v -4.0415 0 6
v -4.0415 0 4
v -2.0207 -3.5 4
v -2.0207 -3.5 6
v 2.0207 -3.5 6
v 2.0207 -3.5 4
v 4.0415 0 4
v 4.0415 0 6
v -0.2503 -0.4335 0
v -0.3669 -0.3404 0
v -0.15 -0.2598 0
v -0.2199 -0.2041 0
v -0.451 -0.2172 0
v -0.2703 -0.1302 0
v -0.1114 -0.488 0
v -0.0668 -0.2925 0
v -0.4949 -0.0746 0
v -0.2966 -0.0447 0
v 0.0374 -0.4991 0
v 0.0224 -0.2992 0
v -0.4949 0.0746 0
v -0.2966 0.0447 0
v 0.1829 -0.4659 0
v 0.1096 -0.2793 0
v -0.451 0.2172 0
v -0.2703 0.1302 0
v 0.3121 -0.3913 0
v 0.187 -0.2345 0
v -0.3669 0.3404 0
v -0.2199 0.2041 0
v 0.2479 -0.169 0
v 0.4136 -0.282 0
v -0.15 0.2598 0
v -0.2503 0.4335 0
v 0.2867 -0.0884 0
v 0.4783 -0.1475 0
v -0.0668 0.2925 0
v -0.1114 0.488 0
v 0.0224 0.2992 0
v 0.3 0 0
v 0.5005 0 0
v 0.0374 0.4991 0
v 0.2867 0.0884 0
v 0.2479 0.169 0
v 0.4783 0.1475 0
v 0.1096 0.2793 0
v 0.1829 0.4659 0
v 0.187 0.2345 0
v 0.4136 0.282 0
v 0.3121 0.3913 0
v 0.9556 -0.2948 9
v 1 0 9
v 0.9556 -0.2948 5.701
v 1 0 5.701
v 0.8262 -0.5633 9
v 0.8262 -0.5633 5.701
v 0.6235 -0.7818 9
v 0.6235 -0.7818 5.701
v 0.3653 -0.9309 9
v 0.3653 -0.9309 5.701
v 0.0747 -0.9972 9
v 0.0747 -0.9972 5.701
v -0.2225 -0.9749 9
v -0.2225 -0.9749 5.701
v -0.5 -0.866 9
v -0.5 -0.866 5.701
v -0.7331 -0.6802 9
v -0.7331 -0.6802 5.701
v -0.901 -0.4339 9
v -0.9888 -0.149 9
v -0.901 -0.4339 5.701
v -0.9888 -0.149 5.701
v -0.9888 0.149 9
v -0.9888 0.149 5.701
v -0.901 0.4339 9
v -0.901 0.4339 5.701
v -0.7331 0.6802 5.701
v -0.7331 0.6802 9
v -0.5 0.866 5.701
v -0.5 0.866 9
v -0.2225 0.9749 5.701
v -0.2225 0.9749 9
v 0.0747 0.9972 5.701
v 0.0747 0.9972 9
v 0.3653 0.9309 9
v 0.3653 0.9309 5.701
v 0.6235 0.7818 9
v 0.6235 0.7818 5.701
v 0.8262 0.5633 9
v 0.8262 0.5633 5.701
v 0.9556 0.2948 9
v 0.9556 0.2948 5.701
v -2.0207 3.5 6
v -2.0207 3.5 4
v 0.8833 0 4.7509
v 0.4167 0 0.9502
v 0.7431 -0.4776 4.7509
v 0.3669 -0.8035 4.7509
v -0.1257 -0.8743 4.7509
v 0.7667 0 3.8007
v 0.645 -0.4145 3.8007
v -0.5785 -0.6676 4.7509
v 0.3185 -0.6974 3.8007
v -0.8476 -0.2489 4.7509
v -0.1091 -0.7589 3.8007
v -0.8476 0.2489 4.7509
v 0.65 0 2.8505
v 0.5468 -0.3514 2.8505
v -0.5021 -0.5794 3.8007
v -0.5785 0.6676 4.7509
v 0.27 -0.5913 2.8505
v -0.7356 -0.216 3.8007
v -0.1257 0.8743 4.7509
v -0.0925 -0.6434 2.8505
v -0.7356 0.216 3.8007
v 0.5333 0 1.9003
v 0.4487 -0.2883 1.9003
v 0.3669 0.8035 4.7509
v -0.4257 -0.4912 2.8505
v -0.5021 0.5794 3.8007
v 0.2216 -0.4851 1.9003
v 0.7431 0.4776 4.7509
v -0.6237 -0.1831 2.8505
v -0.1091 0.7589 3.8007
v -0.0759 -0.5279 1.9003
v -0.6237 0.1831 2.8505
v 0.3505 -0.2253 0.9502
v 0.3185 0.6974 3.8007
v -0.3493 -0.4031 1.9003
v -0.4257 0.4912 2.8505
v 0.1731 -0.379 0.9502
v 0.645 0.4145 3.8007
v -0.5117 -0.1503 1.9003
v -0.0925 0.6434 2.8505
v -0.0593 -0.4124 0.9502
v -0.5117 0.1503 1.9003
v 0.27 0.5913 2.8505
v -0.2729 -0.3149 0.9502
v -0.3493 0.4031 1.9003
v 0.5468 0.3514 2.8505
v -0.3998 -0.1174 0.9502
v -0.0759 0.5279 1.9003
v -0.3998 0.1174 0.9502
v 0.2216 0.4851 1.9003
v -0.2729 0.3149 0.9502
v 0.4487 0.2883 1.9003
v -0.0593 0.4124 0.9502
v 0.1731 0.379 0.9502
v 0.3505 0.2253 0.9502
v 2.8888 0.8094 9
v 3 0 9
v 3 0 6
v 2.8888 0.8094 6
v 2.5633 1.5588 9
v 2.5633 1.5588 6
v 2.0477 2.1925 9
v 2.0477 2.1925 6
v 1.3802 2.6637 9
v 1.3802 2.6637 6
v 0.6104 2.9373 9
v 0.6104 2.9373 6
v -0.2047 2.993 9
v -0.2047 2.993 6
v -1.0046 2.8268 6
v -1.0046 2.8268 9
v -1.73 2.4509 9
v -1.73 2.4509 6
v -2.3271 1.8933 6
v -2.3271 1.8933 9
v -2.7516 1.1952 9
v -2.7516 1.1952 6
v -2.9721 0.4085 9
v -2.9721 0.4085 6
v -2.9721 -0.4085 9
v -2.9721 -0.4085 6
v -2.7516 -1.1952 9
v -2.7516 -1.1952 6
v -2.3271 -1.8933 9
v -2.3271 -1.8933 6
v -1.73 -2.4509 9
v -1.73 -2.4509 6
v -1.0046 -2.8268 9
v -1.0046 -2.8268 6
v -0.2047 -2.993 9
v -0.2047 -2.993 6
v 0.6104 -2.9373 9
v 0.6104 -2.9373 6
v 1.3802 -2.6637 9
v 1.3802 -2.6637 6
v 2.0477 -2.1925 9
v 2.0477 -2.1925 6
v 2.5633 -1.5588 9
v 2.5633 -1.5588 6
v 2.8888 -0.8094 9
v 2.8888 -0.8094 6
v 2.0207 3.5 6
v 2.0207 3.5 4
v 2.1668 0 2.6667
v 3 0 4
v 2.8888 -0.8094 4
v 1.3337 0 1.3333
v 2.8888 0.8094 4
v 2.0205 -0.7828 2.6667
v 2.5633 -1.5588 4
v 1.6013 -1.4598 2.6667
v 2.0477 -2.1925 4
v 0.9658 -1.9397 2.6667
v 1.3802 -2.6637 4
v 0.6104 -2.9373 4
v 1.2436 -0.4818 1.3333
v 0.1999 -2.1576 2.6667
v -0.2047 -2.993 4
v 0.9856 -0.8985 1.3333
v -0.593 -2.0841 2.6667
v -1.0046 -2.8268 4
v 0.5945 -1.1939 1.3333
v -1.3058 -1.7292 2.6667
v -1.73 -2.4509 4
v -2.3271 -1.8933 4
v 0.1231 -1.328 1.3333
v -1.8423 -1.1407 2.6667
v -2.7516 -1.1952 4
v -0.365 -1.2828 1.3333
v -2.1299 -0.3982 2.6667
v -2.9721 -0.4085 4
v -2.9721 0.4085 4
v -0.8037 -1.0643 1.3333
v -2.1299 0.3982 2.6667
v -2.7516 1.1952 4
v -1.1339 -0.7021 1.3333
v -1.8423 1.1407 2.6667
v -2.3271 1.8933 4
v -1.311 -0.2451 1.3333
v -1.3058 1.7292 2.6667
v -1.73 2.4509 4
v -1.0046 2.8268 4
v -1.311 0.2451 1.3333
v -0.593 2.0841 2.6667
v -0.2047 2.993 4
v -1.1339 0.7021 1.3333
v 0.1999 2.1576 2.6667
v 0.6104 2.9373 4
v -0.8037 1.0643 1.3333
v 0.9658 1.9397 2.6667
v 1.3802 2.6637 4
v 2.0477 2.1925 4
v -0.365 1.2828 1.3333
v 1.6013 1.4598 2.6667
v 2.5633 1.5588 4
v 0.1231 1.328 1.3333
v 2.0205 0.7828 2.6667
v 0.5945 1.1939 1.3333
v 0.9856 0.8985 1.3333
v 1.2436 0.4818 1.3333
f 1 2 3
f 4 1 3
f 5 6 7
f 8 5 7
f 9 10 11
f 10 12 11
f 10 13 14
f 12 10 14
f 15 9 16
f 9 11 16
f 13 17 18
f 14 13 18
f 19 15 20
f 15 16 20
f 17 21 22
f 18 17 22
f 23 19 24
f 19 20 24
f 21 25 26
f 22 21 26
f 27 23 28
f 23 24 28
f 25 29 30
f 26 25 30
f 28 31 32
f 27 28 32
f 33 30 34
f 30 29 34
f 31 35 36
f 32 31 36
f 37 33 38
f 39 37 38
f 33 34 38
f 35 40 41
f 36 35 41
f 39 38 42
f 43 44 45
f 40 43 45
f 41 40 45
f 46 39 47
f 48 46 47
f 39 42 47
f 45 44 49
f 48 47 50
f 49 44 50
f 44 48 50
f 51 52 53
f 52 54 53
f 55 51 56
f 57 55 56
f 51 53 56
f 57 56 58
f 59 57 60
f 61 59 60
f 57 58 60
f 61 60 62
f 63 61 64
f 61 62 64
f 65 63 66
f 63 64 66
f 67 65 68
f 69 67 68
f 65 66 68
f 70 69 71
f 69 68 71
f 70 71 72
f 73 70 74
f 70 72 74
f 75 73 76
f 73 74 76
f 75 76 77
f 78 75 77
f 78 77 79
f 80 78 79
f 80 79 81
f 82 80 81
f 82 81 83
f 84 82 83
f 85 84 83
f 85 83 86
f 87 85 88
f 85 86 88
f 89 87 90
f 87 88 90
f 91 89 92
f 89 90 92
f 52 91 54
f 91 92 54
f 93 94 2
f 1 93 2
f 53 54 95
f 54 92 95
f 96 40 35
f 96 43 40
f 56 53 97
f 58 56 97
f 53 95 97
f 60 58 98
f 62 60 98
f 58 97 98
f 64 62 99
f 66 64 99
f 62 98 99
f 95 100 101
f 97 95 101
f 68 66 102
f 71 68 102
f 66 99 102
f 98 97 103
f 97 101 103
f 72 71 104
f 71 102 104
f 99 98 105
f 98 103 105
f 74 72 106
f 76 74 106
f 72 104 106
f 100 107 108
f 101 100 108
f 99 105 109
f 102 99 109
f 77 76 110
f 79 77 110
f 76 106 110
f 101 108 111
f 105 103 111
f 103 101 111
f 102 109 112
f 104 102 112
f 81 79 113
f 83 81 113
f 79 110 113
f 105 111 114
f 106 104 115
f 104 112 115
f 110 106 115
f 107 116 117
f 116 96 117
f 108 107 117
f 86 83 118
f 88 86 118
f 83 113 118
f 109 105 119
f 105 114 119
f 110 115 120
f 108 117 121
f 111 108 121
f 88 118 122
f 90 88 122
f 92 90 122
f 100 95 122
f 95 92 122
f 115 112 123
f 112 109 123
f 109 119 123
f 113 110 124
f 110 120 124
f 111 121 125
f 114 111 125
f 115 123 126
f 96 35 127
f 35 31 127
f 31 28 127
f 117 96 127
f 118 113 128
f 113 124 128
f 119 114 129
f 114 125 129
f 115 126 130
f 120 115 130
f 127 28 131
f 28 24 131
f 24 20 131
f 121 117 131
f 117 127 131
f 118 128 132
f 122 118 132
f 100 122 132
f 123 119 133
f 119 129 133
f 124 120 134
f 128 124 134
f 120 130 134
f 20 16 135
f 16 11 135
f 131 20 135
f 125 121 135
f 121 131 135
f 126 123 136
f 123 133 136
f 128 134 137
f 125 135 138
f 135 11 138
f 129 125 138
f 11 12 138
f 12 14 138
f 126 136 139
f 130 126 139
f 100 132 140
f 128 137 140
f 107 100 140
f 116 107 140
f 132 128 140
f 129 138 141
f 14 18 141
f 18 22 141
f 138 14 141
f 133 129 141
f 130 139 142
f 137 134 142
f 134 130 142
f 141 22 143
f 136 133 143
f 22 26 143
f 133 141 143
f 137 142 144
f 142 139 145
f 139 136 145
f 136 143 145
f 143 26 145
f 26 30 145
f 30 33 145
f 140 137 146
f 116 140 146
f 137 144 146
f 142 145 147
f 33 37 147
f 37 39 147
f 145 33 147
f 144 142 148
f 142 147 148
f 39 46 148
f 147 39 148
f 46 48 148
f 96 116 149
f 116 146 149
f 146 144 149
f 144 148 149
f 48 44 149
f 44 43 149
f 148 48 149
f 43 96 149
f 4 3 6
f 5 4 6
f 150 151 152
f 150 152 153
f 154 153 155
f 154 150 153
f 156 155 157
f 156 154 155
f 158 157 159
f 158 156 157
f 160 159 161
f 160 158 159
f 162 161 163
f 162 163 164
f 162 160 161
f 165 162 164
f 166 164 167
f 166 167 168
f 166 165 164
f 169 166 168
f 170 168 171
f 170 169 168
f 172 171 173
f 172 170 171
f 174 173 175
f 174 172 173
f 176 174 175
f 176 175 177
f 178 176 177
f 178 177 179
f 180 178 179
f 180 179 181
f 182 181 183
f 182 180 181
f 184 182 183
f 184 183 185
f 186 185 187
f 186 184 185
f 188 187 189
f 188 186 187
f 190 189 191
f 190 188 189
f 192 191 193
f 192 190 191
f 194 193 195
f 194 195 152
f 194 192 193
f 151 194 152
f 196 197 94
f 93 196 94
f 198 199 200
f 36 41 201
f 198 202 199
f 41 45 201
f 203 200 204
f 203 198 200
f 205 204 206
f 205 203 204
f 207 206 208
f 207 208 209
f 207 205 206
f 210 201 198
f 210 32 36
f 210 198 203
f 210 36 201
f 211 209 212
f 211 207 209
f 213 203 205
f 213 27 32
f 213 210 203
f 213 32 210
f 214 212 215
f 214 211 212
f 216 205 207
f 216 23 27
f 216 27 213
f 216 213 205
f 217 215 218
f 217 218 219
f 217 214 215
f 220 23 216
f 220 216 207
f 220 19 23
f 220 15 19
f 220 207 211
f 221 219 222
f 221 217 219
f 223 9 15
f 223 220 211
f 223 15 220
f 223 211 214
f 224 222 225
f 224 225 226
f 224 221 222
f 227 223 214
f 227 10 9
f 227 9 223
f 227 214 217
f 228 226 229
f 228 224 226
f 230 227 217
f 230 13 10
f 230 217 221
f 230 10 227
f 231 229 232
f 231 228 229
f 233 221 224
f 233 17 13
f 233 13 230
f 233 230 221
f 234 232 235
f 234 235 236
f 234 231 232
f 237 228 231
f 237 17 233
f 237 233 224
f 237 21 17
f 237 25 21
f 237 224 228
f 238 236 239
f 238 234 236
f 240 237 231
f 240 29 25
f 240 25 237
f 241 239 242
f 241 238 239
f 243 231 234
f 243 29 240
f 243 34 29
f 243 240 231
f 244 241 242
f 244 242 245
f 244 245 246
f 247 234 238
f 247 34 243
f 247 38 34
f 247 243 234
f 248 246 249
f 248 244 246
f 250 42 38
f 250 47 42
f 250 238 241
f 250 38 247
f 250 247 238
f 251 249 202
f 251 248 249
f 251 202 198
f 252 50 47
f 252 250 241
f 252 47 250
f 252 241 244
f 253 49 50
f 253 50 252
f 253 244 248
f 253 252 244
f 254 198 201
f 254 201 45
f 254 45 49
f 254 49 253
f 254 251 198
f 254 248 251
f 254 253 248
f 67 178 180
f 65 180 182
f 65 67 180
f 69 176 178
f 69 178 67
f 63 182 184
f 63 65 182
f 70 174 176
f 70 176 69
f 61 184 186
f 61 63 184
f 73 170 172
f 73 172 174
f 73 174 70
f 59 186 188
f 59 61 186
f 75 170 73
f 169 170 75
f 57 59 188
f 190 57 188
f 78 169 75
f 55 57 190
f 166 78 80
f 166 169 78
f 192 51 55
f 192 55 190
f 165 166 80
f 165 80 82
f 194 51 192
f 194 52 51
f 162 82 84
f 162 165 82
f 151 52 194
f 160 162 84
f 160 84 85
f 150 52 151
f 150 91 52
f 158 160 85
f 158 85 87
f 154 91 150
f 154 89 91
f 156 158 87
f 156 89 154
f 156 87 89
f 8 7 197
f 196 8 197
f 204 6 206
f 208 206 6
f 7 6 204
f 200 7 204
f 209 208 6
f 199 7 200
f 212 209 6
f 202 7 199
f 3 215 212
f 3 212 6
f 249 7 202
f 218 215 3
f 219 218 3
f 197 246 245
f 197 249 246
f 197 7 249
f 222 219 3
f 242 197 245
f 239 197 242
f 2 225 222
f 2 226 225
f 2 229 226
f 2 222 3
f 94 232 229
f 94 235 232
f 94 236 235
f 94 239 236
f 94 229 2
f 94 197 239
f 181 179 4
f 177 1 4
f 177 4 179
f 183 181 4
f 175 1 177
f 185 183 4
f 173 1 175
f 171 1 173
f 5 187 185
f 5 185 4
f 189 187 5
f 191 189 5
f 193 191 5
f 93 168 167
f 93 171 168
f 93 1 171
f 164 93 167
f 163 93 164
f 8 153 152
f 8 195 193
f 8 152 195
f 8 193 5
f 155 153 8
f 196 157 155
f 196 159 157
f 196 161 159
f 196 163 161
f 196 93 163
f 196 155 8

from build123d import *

# Parameters (mm, degrees)
BOSS_EXTRU_1_DEPTH      = 9
ESQUISSE2_W             = 19.623971562
ESQUISSE2_H             = 15.534154535
ESQUISSE2_R             = 3
ENL_V_MAT_EXTRU_1_DEPTH = 3
ENL_V_START             = -4
ESQUISSE3_W             = 11.267201257
ESQUISSE3_H             = 13.961169169
ESQUISSE3_R             = 3
ENL_V_MAT_EXTRU_2_DEPTH = 4
CHANFREIN1_SIZE         = 4
CHANFREIN1_SIZE_2       = 2.499477408


with BuildPart() as part:
    # Esquisse1 → Boss.-Extru.1 (new body)
    with BuildSketch(Plane.XY):
        Polygon((4.041451884, 0), (2.020725942, 3.5), (-2.020725942, 3.5), (-4.041451884, 0), (-2.020725942, -3.5), (2.020725942, -3.5), align=None)
    extrude(amount=BOSS_EXTRU_1_DEPTH)

    # Esquisse2 → Enlèv. mat.-Extru.1 (cut)
    with BuildSketch(Plane.XY.offset(9)):
        with Locations((0.327116653, -1.544441398)):
            Rectangle(ESQUISSE2_W, ESQUISSE2_H)
        Circle(ESQUISSE2_R, mode=Mode.SUBTRACT)
    extrude(amount=-ENL_V_MAT_EXTRU_1_DEPTH, mode=Mode.SUBTRACT)

    # Esquisse3 → Enlèv. mat.-Extru.2 (cut)
    with BuildSketch(Plane(origin=(0, 0, 0), x_dir=(-1, 0, 0), z_dir=(0, 0, -1)).offset(ENL_V_START)):
        with Locations((0.009770186, 0.039262349)):
            Rectangle(ESQUISSE3_W, ESQUISSE3_H)
        with Locations(Location((0, 0, 0), (0, 0, 180))):
            Circle(ESQUISSE3_R, mode=Mode.SUBTRACT)
    extrude(amount=ENL_V_MAT_EXTRU_2_DEPTH, mode=Mode.SUBTRACT)

    # Chanfrein1
    # the kernel refuses this chamfer: 4, 2.499477408 mm, written as the material it takes off along each edge
    with BuildSketch(Plane(origin=(0, 0, 0), x_dir=(1, 0, 0), z_dir=(0, 1, 0))) as chanfrein1_piece_1_section:
        Polygon((3, -CHANFREIN1_SIZE), (3 - CHANFREIN1_SIZE_2, 0), (3, 0), align=None)
    chanfrein1_piece_1 = revolve(axis=Axis((0, 0, 0), (0, 0, -1)), mode=Mode.PRIVATE)
    chanfrein1_piece_1 = split(chanfrein1_piece_1, bisect_by=Plane(origin=(-1.744026904, 0, 4), z_dir=(0, 0, -1)), keep=Keep.TOP, mode=Mode.PRIVATE)
    add(chanfrein1_piece_1, mode=Mode.SUBTRACT)

    # Esquisse4 → Enlèvement de matière-Révolution1 (revolve, cut)
    with BuildSketch(Plane(origin=(0, 0, 0), x_dir=(1, 0, 0), z_dir=(0, 1, 0))):
        Polygon((0, -9), (1, -9), (1, -5.7010425), (0.3, 0), (0, 0), align=None)
    revolve(axis=Axis((0, 0, 10.381605157), (0, 0, -1)), mode=Mode.SUBTRACT)


solid = part.part
